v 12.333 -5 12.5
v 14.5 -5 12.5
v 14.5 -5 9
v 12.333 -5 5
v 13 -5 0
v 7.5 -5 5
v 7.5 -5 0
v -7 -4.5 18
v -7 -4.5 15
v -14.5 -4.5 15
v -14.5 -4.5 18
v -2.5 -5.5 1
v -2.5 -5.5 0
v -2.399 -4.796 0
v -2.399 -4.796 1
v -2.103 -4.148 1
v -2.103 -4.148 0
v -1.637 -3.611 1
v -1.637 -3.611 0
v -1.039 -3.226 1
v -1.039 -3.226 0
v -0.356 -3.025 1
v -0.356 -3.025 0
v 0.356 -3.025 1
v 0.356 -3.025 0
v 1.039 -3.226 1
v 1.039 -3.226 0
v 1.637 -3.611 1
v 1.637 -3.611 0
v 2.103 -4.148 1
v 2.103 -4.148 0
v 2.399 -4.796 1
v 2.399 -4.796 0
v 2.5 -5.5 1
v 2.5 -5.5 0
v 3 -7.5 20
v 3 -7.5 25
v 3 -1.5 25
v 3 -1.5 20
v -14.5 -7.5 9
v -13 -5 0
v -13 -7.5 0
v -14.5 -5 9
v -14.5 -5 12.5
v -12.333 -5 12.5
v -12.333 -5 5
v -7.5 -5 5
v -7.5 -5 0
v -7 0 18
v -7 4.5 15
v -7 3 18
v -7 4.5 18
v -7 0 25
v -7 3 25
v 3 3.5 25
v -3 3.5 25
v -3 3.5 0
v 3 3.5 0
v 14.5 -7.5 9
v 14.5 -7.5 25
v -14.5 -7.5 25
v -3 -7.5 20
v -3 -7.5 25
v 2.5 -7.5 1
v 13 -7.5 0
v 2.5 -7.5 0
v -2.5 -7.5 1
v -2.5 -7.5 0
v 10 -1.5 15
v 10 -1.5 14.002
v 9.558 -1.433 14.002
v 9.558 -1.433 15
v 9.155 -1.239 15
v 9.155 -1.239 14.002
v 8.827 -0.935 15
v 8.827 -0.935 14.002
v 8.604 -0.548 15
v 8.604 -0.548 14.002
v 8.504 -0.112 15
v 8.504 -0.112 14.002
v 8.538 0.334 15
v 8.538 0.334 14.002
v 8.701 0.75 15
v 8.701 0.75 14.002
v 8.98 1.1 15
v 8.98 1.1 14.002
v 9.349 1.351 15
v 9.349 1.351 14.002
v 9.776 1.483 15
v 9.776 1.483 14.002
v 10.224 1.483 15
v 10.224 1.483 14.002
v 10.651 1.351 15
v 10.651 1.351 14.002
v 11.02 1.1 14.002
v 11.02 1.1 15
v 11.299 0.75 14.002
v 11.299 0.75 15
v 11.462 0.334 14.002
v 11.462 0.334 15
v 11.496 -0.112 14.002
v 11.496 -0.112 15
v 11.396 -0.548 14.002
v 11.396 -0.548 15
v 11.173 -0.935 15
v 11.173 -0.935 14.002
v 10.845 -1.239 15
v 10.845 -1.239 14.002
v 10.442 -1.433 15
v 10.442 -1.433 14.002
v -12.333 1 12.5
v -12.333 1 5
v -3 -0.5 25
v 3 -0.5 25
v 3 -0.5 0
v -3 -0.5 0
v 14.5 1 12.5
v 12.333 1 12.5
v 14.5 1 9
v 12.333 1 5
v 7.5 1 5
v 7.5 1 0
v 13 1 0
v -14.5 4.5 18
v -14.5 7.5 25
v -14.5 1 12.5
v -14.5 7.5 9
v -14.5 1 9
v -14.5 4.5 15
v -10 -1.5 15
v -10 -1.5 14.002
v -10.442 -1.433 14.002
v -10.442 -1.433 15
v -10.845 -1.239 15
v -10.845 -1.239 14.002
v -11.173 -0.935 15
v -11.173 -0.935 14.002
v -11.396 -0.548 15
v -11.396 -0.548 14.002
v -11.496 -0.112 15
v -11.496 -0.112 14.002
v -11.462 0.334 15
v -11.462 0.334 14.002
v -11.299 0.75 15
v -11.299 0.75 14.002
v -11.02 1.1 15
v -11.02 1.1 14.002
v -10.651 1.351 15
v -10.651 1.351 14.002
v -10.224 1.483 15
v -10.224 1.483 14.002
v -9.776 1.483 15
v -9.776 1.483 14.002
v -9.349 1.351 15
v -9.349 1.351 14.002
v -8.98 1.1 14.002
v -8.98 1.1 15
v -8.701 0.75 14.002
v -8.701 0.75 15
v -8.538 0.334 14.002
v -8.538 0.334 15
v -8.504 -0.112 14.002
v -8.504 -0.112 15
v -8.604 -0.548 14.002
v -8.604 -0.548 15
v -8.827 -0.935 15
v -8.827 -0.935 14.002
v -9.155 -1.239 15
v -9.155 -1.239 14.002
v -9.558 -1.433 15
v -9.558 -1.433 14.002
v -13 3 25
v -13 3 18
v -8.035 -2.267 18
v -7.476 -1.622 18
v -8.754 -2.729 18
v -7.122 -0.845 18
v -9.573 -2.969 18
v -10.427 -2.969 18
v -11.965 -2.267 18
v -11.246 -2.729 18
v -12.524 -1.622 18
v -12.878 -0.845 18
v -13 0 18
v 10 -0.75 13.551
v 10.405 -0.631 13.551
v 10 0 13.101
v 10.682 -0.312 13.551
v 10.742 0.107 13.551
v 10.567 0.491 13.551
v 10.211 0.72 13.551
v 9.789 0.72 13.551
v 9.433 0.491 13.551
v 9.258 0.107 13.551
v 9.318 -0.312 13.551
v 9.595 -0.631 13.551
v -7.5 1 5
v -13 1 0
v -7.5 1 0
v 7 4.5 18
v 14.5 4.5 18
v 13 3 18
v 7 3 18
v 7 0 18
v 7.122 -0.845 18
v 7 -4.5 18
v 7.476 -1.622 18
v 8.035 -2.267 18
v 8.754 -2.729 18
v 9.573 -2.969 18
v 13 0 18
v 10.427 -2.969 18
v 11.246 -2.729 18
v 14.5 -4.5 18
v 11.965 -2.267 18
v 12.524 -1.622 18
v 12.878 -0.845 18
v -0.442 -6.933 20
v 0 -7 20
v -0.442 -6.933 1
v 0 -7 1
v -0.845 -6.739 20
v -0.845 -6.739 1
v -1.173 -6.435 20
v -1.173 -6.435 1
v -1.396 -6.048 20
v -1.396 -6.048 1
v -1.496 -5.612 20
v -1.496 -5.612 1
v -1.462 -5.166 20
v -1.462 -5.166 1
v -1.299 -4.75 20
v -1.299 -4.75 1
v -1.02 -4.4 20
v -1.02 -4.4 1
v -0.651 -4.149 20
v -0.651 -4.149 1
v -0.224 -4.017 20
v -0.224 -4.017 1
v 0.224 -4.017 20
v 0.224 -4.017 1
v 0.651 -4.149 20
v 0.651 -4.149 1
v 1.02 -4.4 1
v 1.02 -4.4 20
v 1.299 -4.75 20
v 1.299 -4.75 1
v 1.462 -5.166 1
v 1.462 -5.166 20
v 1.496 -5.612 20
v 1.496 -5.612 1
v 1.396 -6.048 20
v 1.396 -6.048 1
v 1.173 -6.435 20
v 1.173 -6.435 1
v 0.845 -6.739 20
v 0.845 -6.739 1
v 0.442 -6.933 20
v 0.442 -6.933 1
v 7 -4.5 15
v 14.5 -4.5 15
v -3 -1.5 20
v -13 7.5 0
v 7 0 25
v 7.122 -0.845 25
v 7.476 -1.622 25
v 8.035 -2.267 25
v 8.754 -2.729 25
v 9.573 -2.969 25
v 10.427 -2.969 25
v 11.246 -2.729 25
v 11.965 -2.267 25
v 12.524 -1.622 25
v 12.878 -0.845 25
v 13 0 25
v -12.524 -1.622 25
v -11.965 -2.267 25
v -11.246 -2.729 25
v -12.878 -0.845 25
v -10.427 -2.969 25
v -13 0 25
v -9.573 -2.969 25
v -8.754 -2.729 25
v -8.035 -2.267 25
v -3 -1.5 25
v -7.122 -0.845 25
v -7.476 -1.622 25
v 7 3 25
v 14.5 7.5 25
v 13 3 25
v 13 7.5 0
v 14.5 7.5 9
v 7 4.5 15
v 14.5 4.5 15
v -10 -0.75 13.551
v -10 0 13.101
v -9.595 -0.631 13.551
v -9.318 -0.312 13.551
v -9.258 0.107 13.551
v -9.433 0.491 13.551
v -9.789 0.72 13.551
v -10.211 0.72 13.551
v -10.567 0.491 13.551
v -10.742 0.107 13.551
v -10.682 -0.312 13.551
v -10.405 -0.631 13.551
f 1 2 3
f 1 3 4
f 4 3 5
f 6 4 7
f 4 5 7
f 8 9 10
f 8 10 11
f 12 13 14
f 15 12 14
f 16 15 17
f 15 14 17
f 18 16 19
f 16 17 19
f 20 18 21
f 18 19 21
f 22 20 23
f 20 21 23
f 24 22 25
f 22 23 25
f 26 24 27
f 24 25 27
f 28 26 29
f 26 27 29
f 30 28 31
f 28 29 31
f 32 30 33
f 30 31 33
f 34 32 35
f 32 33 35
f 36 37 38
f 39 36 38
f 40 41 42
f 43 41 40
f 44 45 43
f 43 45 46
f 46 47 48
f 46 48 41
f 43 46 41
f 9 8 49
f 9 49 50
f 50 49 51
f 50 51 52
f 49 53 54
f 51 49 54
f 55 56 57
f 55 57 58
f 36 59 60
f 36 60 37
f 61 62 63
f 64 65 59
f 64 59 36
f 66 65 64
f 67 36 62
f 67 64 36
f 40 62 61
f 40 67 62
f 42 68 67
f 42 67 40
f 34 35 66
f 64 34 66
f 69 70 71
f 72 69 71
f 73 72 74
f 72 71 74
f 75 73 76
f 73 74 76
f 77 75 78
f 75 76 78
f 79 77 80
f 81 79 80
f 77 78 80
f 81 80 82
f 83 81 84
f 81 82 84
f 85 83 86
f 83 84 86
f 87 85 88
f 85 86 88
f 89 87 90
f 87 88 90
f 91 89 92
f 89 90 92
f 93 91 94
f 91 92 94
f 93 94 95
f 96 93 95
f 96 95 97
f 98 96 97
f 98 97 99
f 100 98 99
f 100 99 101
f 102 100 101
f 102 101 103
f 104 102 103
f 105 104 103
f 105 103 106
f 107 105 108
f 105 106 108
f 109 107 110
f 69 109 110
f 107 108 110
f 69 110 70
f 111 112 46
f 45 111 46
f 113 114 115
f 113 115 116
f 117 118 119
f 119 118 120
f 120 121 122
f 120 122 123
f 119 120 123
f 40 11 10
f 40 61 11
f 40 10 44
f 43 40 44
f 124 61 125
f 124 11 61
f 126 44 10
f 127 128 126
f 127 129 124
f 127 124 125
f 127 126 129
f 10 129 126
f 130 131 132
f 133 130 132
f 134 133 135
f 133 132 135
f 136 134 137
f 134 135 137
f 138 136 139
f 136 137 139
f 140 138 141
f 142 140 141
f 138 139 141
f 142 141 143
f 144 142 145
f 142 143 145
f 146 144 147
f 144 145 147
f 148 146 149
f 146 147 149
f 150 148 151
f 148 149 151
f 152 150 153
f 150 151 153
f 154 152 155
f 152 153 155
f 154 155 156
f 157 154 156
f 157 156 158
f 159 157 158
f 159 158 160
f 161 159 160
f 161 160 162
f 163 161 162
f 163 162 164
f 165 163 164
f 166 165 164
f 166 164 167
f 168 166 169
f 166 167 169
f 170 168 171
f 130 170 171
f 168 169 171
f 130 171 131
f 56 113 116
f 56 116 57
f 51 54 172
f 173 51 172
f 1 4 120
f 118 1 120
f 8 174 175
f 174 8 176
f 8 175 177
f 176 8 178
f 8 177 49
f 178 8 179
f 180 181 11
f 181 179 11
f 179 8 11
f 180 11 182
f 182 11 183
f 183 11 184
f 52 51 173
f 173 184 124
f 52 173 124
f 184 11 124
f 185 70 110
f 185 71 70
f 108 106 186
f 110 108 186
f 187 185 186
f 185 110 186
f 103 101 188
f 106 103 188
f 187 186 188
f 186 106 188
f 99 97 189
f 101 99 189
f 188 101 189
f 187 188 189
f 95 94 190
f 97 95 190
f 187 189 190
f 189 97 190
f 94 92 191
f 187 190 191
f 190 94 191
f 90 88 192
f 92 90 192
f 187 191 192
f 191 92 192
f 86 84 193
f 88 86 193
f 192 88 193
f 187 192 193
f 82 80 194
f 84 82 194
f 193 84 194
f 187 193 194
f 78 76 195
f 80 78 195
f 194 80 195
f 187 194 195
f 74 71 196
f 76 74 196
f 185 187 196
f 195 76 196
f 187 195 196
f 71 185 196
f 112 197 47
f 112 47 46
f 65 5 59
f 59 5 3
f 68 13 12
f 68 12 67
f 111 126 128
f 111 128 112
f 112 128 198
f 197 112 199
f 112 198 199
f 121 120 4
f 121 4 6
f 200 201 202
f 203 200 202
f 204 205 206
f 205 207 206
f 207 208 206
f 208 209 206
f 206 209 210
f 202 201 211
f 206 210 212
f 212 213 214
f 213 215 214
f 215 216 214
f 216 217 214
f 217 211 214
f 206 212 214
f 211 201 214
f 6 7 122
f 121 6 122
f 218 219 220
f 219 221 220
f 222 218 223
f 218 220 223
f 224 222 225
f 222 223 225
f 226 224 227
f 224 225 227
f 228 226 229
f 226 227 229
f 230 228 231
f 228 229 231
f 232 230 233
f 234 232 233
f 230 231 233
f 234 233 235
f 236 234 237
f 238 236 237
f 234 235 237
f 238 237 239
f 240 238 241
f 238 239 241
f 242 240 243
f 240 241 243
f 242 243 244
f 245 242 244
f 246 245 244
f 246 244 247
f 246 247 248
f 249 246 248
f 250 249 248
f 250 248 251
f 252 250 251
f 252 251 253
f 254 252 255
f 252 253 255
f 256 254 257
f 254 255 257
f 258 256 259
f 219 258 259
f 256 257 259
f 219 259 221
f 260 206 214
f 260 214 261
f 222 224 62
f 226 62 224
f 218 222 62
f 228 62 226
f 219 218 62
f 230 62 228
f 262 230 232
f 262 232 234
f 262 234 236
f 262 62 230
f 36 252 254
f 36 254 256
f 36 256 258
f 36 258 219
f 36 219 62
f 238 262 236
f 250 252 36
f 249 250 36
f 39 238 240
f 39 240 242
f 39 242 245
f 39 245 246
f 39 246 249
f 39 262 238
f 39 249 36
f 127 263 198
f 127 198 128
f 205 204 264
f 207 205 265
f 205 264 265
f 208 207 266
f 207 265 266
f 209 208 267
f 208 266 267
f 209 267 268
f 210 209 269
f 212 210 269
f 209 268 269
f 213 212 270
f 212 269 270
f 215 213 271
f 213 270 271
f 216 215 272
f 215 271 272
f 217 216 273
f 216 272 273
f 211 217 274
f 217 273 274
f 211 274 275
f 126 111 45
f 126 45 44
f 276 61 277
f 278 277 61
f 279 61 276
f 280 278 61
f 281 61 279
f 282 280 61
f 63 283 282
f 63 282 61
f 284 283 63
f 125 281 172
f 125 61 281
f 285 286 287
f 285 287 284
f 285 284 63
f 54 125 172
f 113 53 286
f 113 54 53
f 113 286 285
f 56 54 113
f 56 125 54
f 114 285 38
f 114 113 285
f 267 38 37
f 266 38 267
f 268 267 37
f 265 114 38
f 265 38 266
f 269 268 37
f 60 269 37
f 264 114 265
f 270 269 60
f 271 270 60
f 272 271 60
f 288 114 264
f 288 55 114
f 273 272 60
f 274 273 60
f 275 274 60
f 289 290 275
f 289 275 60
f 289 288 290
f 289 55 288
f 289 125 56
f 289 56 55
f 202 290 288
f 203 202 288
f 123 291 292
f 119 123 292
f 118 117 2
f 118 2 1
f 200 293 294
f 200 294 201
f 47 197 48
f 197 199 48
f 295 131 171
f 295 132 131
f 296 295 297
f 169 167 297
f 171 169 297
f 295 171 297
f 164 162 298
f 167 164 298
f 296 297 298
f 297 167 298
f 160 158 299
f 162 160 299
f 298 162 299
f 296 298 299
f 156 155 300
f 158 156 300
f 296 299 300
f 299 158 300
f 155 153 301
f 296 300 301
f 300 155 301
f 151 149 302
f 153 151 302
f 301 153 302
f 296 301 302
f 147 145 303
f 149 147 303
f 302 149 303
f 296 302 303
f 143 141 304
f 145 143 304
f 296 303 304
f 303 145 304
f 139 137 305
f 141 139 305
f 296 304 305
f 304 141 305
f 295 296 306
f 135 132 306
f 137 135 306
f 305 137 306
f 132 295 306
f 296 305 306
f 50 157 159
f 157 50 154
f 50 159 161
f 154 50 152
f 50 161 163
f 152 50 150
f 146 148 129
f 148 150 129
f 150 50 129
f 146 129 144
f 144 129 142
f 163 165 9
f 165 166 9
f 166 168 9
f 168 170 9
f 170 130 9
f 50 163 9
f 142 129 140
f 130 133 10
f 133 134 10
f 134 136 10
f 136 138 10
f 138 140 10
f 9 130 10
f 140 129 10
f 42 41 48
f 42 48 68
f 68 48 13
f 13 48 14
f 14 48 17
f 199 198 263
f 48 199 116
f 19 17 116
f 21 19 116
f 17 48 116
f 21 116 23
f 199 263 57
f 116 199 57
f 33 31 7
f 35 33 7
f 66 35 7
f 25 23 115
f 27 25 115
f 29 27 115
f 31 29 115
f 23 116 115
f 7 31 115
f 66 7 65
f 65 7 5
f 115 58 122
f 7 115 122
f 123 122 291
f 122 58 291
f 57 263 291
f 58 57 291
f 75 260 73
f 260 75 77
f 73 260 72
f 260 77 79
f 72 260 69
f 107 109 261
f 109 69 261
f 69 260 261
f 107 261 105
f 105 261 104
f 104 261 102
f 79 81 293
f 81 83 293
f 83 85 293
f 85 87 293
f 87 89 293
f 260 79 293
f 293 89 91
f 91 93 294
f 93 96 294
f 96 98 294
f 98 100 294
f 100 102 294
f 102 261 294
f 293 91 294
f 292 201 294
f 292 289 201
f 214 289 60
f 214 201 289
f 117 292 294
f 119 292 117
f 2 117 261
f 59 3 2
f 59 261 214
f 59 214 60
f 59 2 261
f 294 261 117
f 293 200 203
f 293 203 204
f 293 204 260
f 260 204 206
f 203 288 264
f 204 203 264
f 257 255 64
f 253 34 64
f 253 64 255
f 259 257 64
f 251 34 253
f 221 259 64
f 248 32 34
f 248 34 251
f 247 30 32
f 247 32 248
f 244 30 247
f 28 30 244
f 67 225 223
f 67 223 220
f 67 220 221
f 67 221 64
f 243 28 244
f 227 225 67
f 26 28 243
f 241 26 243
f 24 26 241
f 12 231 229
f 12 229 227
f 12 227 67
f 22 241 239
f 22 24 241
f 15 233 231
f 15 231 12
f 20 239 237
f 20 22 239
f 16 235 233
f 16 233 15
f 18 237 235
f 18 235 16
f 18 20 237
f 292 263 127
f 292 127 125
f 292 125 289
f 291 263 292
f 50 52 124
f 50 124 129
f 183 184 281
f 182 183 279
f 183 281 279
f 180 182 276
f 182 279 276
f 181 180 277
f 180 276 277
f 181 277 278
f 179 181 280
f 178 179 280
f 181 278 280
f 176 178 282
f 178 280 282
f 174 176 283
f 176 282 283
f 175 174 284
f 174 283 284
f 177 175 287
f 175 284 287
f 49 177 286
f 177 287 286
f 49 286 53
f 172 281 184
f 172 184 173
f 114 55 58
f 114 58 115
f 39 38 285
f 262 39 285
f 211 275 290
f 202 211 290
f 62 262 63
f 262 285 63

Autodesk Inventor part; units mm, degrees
ref_plane "YZ Plane" through (0, 0, 0) normal (1, 0, 0) x (0, 1, 0)
ref_plane "XZ Plane" through (0, 0, 0) normal (0, 1, 0) x (-1, 0, 0)
ref_plane "XY Plane" through (0, 0, 0) normal (0, 0, 1) x (1, 0, 0)
sketch "Esboço1" plane through (0, 0, 0) normal (0, 0, 1) x (1, 0, 0)
  line L0 (-14.5, 7.5) -> (14.5, 7.5)
  line L1 (14.5, 7.5) -> (14.5, -7.5)
  line L2 (14.5, -7.5) -> (-14.5, -7.5)
  line L3 (-14.5, -7.5) -> (-14.5, 7.5)
  line L4 (-14.5, 7.5) -> (14.5, -7.5) construction
  line L5 (14.5, 7.5) -> (-14.5, -7.5) construction
  point P0 (0, 0)
  dimension "d0" = 29
  dimension "d1" = 15
extrude "Extrusão1" add sketch "Esboço1" along normal blind 25
sketch "Esboço2" plane through (-14.5, 7.5, 0) normal (0, 1, 0) x (1, 0, 0)
  line L0 (0, 0) -> (0, -25) projected
  line L1 (0, 0) -> (0, -9)
  line L2 (29, 0) -> (29, -25) projected
  line L3 (29, 0) -> (29, -9)
  line L4 (1.5, 0) -> (27.5, 0)
  line L5 (27.5, 0) -> (27.5, -9)
  line L6 (27.5, -9) -> (1.5, -9)
  line L7 (1.5, -9) -> (1.5, 0)
  line L8 (1.5, 0) -> (27.5, -9) construction
  line L9 (27.5, 0) -> (1.5, -9) construction
  line L10 (1.5, 0) -> (0, -9)
  line L11 (27.5, 0) -> (29, -9)
  line L12 (29, 0) -> (0, 0) projected
  line L13 (0, 0) -> (0, -25) projected
  line L14 (29, -25) -> (0, -25) projected
  line L15 (29, 0) -> (29, -25) projected
  point P0 (14.5, 0)
  point P1 (14.5, -4.5)
  dimension "d4" = 9
  dimension "d5" = 9
  dimension "d6" = 26
extrude "Extrusão2" cut sketch "Esboço2" against normal through all contours L12 L10 L0 | L12 L2 L11
sketch "Esboço3" plane through (0, 0, 25) normal (0, 0, 1) x (1, 0, 0)
  circle A0 centre (10, 0) radius 3
  circle A1 centre (-10, 0) radius 3
  line L0 (-13, -7.5) -> (-13, 7.5) projected
  line L1 (-7, 3) -> (-13, 3)
  line L2 (-13, 3) -> (-13, -3)
  line L3 (-13, -3) -> (-7, -3)
  line L4 (-7, -3) -> (-7, 3)
  line L5 (-7, 3) -> (-13, -3) construction
  line L6 (-13, 3) -> (-7, -3) construction
  line L7 (13, 3) -> (7, 3)
  line L8 (7, 3) -> (7, -3)
  line L9 (7, -3) -> (13, -3)
  line L10 (13, -3) -> (13, 3)
  line L11 (13, 3) -> (7, -3) construction
  line L12 (7, 3) -> (13, -3) construction
  line L13 (3, -1.5) -> (-3, -1.5)
  line L14 (-3, -1.5) -> (-3, -7.5)
  line L15 (-3, -7.5) -> (3, -7.5)
  line L16 (3, -7.5) -> (3, -1.5)
  line L17 (3, -1.5) -> (-3, -7.5) construction
  line L18 (-3, -1.5) -> (3, -7.5) construction
  line L19 (-14.5, -7.5) -> (14.5, -7.5) projected
  point P0 (0, 0)
  point P1 (0, -4.5)
  point P2 (-7, 0)
  point P3 (-13, 0)
  point P4 (7, 0)
  point P5 (13, 0)
  dimension "d9" = 6
  dimension "d10" = 6
  dimension "d11" = 10
  dimension "d12" = 10
  dimension "d13" = 6
  dimension "d14" = 6
  dimension "d15" = 0
extrude "Extrusão3" cut sketch "Esboço3" against normal blind 10 contours A0 | A0 L7 L10 | A0 L8 L7 | A1 | A1 L1 L4 | A1 L0 L1
sketch "Esboço4" plane through (-14.5, -7.5, 25) normal (-1, 0, 0) x (0, 0, 1)
  line L0 (-7, 12) -> (-10, 12)
  line L1 (-10, 12) -> (-10, 3)
  line L2 (-10, 3) -> (-7, 3)
  line L3 (-7, 3) -> (-7, 12)
  line L4 (-7, 12) -> (-10, 3) construction
  line L5 (-10, 12) -> (-7, 3) construction
  line L6 (-10, 7.5) -> (-10, 10.5) projected
  point P0 (-25, 7.5)
  point P1 (-8.5, 7.5)
  dimension "d18" = 3
  dimension "d19" = 9
  dimension "d20" = 0
extrude "Extrusão4" cut sketch "Esboço4" against normal blind 7.5
sketch "Esboço5" plane through (14.5, -7.5, 25) normal (1, 0, 0) x (0, 0, -1)
  line L0 (7, 3) -> (10, 3)
  line L1 (10, 3) -> (10, 12)
  line L2 (10, 12) -> (7, 12)
  line L3 (7, 12) -> (7, 3)
  line L4 (0, 7.5) -> (10, 7.5) projected
  line L5 (7, 3) -> (10, 12) construction
  line L6 (10, 3) -> (7, 12) construction
  line L7 (10, 4.5) -> (10, 7.5) projected
  point P0 (25, 7.5)
  point P1 (8.5, 7.5)
  dimension "d23" = 3
  dimension "d24" = 9
  dimension "d25" = 0
extrude "Extrusão5" cut sketch "Esboço5" against normal blind 7.5
sketch "Esboço6" plane through (0, 0, 25) normal (0, 0, 1) x (1, 0, 0)
  line L0 (-3, -7.5) -> (3, -7.5)
  line L1 (3, -7.5) -> (3, -1.5)
  line L2 (3, -1.5) -> (-3, -1.5)
  line L3 (-3, -1.5) -> (-3, -7.5)
  line L4 (-3, -7.5) -> (3, -1.5) construction
  line L5 (3, -7.5) -> (-3, -1.5) construction
  line L6 (-14.5, -7.5) -> (14.5, -7.5) projected
  line L7 (-3, -0.5) -> (3, -0.5)
  line L8 (3, -0.5) -> (3, 3.5)
  line L9 (3, 3.5) -> (-3, 3.5)
  line L10 (-3, 3.5) -> (-3, -0.5)
  line L11 (-3, -0.5) -> (3, 3.5) construction
  line L12 (3, -0.5) -> (-3, 3.5) construction
  point P0 (0, 0)
  point P1 (0, -4.5)
  point P2 (0, 1.5)
  dimension "d28" = 6
  dimension "d29" = 6
  dimension "d30" = 0
  dimension "d31" = 6
  dimension "d32" = 4
extrude "Extrusão6" cut sketch "Esboço6" against normal blind 5
sketch "Esboço8" plane through (0, 0, 20) normal (0, 0, 1) x (1, 0, 0)
  line L0 (3, -7.5) -> (-3, -7.5) projected
  point P0 (0, 0)
  point P1 (0, -5.5)
  point P2 (0, -7.5)
  dimension "d42" = 2
  dimension "d43" = 0
hole "Furo1" at (0, -5.5, 20) direction (0, 0, -1) diameter 3 end through all
sketch "Esboço9" plane through (0, 0, 0) normal (0, 0, -1) x (-1, 0, 0)
  circle A0 centre (0, -5.5) radius 1.5 projected
  circle A1 centre (0, -5.5) radius 2.5
  line L0 (2.5, -5.5) -> (2.5, -7.5)
  line L1 (13, -7.5) -> (-13, -7.5) projected
  line L2 (-2.5, -5.5) -> (-2.5, -7.5)
  line L3 (2.5, -7.5) -> (-2.5, -7.5)
  point P0 (0, 0)
  point P1 (-1.5, -7.5)
  point P2 (1.5, -7.5)
  point P3 (-1.5, -7.5)
  dimension "d44" = 5
extrude "Extrusão7" cut sketch "Esboço9" against normal blind 1 contours A1 L1 | L0 L1 A1 | A1 L1 L2 picked at (0.0603, -7.3297)
sketch "Esboço10" plane through (0, 0, 0) normal (0, 0, -1) x (-1, 0, 0)
  line L0 (14.5, 1) -> (7.5, 1)
  line L1 (7.5, 1) -> (7.5, -5)
  line L2 (7.5, -5) -> (14.5, -5)
  line L3 (14.5, -5) -> (14.5, 1)
  line L4 (14.5, 1) -> (7.5, -5) construction
  line L5 (7.5, 1) -> (14.5, -5) construction
  line L6 (14.5, 7.5) -> (14.5, -7.5) projected
  line L7 (13, -7.5) -> (2.5, -7.5) projected
  line L8 (-7.5, 1) -> (-14.5, 1)
  line L9 (-14.5, 1) -> (-14.5, -5)
  line L10 (-14.5, -5) -> (-7.5, -5)
  line L11 (-7.5, -5) -> (-7.5, 1)
  line L12 (-7.5, 1) -> (-14.5, -5) construction
  line L13 (-14.5, 1) -> (-7.5, -5) construction
  line L14 (-14.5, -7.5) -> (-14.5, 7.5) projected
  line L15 (-2.5, -7.5) -> (-13, -7.5) projected
  point P0 (0, 0)
  point P1 (11, -2)
  point P2 (11, -5)
  point P3 (-11, -2)
  dimension "d47" = 7
  dimension "d48" = 6
  dimension "d49" = 0
  dimension "d50" = 2.5
  dimension "d51" = 7
  dimension "d52" = 6
  dimension "d53" = 0
  dimension "d54" = 2.5
extrude "Extrusão8" cut sketch "Esboço10" against normal blind 5
sketch "Esboço11" plane through (0, 0, 5) normal (0, 0, -1) x (-1, 0, 0)
  line L0 (15.3333, 1) -> (12.3333, 1)
  line L1 (12.3333, 1) -> (12.3333, -5)
  line L2 (12.3333, -5) -> (15.3333, -5)
  line L3 (15.3333, -5) -> (15.3333, 1)
  line L4 (13.8333, 1) -> (13.8333, -5) projected
  line L5 (15.3333, 1) -> (12.3333, -5) construction
  line L6 (12.3333, 1) -> (15.3333, -5) construction
  line L7 (-12.3333, 1) -> (-15.3333, 1)
  line L8 (-15.3333, 1) -> (-15.3333, -5)
  line L9 (-15.3333, -5) -> (-12.3333, -5)
  line L10 (-12.3333, -5) -> (-12.3333, 1)
  line L11 (-13.8333, -5) -> (-13.8333, 1) projected
  line L12 (-12.3333, 1) -> (-15.3333, -5) construction
  line L13 (-15.3333, 1) -> (-12.3333, -5) construction
  point P0 (0, 0)
  point P1 (13.8333, -2)
  point P2 (-13.8333, -2)
  dimension "d57" = 3
  dimension "d58" = 6
  dimension "d59" = 3
  dimension "d60" = 6
extrude "Extrusão9" cut sketch "Esboço11" against normal blind 7.5
sketch "Esboço12" plane through (0, 0, 15) normal (0, 0, 1) x (1, 0, 0)
  arc A0 (7, 0) -> (13, 0) centre (10, 0) ccw projected
  arc A1 (-13, 0) -> (-7, 0) centre (-10, 0) ccw projected
  point P0 (0, 0)
  dimension "d70" = 0
  dimension "d71" = 0
  dimension "d72" = 0
  dimension "d73" = 0
hole "Furo2" at (10, 0, 15) at (-10, 0, 15) direction (0, 0, -1) diameter 3 depth 0.998 tip angle 118
sketch "Esboço14" plane through (0, 0, 20) normal (0, 0, 1) x (1, 0, 0)
  line L0 (3, 3.5) -> (3, -0.5) projected
  line L1 (-3, 3.5) -> (3, 3.5) projected
  line L2 (-3, -0.5) -> (-3, 3.5) projected
  line L3 (3, -0.5) -> (-3, -0.5) projected
  point P0 (0, 0)
extrude "Extrusão11" cut sketch "Esboço14" against normal through all
properties part number "BLOCO DE CONTATO"
